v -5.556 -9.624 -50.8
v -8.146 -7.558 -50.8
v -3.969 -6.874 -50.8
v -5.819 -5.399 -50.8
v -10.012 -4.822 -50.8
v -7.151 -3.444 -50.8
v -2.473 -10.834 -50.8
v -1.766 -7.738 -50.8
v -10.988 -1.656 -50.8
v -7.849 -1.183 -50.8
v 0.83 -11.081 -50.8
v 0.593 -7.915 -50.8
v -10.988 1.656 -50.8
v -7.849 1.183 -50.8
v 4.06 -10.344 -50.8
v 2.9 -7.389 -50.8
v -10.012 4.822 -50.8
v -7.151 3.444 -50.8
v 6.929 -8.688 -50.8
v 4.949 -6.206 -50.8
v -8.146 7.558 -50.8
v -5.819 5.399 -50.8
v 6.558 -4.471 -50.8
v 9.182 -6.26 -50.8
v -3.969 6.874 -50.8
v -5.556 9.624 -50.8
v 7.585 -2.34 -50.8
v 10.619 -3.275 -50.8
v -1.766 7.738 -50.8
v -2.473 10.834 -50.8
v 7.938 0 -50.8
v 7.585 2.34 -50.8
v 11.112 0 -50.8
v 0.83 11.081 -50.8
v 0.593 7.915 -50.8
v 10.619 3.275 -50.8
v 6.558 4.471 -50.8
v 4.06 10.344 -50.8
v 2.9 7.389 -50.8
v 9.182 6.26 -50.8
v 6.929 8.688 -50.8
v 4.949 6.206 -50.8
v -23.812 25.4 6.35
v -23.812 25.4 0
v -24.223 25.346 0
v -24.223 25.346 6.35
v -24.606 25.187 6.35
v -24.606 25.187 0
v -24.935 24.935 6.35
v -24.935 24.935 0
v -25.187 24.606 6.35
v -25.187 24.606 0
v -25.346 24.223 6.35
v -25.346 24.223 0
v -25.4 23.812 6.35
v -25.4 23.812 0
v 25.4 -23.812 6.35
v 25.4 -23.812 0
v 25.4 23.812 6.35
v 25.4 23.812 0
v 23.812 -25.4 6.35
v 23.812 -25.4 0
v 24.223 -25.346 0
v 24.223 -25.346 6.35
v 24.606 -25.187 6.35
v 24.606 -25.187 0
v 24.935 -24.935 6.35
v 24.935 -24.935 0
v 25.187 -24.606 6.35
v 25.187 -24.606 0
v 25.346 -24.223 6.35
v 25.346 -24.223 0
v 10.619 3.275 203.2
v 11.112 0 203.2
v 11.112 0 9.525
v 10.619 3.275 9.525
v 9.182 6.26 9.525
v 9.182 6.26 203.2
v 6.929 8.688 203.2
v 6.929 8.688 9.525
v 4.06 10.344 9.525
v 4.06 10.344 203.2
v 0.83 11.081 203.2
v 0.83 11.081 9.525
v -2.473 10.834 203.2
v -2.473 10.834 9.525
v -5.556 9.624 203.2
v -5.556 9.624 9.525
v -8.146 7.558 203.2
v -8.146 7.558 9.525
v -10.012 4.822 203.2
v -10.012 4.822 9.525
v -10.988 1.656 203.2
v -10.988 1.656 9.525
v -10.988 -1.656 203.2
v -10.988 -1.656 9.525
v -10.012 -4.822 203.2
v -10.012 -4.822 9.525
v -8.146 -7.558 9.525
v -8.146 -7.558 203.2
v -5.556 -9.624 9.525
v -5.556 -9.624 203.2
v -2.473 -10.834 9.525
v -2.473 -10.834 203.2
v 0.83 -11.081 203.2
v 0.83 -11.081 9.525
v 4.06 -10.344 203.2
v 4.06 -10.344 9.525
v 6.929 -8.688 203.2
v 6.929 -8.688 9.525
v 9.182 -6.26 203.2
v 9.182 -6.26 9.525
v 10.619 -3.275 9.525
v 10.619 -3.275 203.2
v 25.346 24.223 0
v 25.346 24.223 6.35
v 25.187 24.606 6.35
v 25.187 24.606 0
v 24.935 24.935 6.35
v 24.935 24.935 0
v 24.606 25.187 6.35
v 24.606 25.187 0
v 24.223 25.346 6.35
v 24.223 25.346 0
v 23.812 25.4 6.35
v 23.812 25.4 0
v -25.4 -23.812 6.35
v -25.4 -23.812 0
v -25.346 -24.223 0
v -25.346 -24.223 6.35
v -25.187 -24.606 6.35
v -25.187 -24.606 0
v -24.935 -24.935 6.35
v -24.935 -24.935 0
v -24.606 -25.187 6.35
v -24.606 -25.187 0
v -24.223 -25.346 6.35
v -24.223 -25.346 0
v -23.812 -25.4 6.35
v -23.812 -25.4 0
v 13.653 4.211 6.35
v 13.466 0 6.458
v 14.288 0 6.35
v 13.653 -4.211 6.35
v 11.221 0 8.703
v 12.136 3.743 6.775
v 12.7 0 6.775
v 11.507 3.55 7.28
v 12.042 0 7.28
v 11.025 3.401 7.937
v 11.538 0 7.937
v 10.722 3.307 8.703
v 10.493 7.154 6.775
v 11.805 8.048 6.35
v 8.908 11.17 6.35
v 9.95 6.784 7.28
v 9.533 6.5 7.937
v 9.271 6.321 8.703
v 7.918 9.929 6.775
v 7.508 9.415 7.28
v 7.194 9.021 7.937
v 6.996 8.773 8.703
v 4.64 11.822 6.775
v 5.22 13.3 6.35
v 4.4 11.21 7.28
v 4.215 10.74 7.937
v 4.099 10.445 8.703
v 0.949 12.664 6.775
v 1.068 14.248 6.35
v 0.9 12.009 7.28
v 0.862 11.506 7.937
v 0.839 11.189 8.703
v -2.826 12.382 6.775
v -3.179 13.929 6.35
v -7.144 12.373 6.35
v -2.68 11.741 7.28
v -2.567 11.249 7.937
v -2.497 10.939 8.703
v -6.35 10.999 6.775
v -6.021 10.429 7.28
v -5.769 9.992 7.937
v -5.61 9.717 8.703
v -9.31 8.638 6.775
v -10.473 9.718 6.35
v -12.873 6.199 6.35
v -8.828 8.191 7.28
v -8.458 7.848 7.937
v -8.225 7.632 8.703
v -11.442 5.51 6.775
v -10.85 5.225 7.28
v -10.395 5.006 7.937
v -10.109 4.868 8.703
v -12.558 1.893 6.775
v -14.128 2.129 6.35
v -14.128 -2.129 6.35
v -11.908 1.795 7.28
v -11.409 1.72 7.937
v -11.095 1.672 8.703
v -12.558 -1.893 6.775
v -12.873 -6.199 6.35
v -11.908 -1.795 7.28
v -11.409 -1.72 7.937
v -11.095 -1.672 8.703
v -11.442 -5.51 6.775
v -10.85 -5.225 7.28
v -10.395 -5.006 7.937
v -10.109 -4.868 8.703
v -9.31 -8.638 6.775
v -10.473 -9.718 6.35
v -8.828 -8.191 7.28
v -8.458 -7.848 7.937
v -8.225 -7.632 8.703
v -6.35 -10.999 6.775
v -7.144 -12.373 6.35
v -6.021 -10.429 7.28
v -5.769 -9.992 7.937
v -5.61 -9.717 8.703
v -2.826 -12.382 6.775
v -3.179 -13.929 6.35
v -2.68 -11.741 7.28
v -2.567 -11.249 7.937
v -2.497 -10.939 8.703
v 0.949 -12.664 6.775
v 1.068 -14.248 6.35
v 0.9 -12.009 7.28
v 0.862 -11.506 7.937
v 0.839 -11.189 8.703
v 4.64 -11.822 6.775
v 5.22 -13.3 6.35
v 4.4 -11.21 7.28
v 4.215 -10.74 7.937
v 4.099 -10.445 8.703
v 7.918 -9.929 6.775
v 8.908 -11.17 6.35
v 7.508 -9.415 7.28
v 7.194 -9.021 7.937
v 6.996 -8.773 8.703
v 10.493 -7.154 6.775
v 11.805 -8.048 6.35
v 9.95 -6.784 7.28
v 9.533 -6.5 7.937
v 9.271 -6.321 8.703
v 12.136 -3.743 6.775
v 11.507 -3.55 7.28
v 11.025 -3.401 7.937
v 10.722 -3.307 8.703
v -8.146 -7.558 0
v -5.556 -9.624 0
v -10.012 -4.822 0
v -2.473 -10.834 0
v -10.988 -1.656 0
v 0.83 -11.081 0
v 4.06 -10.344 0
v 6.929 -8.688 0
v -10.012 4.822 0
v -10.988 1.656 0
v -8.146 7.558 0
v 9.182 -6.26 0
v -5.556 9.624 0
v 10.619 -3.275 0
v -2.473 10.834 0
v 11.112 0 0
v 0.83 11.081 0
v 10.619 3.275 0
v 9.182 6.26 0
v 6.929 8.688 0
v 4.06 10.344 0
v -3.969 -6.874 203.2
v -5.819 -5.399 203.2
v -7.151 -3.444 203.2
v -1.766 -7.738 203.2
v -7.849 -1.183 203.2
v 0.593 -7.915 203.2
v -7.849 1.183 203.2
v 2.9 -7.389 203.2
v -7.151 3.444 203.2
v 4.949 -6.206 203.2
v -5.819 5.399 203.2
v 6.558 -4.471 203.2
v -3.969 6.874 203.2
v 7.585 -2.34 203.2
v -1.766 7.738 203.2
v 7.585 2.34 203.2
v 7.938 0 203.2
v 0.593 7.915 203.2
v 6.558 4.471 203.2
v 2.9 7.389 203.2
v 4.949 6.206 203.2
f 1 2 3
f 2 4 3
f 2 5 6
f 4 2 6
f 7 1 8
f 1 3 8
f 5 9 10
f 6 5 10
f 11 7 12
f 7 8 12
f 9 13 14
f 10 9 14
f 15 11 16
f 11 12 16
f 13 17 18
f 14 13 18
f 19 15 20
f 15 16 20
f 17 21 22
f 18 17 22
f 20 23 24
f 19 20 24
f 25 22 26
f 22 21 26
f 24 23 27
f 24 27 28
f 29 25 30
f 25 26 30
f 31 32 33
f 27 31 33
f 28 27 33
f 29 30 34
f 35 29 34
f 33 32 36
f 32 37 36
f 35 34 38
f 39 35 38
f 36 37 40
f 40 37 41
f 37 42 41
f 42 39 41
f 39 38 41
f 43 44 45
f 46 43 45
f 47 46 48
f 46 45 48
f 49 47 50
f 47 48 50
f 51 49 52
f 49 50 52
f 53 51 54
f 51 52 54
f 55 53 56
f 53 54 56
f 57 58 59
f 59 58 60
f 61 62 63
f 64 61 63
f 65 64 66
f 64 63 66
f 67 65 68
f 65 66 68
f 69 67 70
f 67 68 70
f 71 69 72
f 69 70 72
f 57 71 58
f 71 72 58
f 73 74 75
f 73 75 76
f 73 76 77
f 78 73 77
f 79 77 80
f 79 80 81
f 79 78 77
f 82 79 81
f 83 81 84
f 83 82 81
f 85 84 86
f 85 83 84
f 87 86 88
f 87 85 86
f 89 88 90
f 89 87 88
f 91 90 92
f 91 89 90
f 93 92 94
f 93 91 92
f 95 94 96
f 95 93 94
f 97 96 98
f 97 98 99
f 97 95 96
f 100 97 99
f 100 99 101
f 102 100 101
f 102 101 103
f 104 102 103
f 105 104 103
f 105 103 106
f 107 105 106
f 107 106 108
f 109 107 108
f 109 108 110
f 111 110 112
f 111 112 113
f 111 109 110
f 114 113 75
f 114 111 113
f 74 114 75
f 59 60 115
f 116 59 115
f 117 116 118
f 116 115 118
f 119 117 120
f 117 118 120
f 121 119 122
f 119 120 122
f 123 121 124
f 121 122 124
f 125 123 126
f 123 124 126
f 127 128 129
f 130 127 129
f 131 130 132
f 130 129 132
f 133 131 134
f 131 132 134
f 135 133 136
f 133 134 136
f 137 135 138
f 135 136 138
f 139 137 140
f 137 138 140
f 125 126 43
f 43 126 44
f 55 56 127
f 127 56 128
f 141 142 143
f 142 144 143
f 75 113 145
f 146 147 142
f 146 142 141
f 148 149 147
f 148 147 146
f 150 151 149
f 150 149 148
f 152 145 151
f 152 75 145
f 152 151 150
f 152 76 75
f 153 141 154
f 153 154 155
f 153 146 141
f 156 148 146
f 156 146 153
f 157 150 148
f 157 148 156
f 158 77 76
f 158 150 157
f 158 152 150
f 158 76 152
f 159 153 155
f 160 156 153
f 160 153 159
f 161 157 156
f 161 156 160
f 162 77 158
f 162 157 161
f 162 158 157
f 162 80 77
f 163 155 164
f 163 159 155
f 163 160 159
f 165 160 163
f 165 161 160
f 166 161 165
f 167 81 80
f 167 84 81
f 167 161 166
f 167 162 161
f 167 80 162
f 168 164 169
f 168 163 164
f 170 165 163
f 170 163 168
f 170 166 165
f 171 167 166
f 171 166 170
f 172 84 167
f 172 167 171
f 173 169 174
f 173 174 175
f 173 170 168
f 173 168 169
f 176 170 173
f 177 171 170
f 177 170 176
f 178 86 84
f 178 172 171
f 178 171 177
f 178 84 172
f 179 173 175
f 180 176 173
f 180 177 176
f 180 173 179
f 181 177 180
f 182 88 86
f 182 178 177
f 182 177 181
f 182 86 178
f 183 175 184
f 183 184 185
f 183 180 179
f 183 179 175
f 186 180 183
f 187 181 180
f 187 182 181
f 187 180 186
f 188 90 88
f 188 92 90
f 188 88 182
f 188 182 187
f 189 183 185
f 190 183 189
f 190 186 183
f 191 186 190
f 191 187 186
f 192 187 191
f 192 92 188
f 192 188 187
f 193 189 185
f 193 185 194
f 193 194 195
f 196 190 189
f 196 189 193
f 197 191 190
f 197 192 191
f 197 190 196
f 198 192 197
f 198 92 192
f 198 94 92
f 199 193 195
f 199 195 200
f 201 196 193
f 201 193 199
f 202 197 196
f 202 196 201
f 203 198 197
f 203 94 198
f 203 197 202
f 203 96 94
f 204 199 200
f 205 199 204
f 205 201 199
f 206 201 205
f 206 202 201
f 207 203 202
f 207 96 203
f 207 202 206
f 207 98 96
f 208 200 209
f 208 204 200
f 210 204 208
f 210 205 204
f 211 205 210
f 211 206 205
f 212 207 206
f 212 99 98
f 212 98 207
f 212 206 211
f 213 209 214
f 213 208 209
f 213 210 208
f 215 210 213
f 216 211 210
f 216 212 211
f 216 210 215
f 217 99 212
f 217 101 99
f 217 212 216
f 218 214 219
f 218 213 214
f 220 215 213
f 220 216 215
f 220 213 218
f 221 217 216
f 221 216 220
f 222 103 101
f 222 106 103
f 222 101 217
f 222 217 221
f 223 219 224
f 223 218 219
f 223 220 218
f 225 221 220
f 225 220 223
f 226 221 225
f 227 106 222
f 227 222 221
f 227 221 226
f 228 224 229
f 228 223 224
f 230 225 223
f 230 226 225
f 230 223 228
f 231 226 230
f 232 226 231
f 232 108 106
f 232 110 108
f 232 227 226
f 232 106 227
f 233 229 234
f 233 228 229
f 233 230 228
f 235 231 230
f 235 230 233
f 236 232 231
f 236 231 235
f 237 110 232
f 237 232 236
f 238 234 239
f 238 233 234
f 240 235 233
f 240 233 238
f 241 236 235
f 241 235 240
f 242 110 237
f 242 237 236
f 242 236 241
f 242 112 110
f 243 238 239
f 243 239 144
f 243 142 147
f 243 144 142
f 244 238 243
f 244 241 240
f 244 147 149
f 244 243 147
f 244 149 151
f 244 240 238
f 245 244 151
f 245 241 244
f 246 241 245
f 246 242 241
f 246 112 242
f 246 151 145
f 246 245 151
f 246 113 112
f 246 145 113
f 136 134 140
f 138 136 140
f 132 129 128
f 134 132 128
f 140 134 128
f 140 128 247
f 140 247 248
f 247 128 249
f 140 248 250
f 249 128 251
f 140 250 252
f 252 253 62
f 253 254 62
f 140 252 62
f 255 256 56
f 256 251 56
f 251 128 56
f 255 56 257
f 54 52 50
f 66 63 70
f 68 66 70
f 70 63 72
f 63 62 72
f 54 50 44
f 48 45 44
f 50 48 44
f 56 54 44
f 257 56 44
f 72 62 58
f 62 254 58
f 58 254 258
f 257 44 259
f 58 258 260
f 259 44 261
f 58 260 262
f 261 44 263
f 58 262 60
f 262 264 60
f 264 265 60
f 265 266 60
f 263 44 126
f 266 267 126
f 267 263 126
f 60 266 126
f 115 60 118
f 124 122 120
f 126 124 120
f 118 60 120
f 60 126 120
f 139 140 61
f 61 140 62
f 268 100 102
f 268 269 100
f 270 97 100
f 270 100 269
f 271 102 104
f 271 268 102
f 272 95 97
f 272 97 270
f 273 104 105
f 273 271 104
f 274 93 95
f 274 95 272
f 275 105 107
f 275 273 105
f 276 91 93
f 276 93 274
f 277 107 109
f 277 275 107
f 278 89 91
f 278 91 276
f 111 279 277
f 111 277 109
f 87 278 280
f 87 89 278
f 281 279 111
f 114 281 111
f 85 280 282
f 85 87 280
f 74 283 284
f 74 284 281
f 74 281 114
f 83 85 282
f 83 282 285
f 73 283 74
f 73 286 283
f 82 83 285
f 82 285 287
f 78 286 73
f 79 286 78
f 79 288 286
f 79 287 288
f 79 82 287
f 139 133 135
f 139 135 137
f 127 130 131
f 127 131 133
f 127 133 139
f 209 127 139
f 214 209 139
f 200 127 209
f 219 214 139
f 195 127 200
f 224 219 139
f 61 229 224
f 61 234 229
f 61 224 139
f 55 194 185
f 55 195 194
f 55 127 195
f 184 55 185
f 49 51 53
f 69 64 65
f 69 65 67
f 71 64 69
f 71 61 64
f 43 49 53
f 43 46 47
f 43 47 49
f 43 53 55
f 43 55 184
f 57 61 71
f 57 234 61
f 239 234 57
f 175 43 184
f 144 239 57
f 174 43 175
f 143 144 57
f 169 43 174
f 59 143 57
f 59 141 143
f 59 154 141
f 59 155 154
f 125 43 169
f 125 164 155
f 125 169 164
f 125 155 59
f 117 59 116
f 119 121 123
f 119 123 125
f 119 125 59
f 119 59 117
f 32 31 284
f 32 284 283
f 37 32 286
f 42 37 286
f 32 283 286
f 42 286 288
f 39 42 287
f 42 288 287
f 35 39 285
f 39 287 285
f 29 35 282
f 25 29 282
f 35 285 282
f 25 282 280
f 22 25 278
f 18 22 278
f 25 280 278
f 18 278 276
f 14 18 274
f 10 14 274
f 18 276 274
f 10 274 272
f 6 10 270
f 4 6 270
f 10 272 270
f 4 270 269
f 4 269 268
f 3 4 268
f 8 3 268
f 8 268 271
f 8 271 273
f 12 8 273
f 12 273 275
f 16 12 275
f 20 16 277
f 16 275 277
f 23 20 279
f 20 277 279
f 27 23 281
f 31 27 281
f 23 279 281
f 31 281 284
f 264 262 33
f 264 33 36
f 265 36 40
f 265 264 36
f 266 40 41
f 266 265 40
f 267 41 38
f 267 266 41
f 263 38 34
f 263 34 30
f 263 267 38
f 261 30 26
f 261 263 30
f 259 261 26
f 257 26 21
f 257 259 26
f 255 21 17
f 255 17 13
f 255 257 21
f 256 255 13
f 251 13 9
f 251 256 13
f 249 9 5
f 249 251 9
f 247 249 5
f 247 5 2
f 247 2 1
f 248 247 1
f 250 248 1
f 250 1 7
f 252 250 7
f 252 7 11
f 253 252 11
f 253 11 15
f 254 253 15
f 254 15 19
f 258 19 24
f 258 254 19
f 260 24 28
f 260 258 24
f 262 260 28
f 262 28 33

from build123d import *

# Parameters (mm, degrees)
F0_R          = 11.1125
F0_R_2        = 7.9375
F1_DEPTH      = 203.2
F1_DEPTH_BACK = 50.8
F2_R          = 7.9375
F3_DEPTH      = 6.35
F4_R          = 3.175


with BuildPart() as f1:
    # F0 (on Top) → F1 (new body, two sides)
    with BuildSketch(Plane.XY) as f1_sk:
        Circle(F0_R)
        Circle(F0_R_2, mode=Mode.SUBTRACT)
    extrude(amount=F1_DEPTH)
    extrude(f1_sk.sketch, amount=-F1_DEPTH_BACK)

    # F2 (on Top) → F3 (join)
    with BuildSketch(Plane.XY):
        with BuildLine():
            ThreePointArc((25.4, 23.8125), (24.935032, 24.935032), (23.8125, 25.4))
            Line((23.8125, 25.4), (-23.8125, 25.4))
            ThreePointArc((-23.8125, 25.4), (-24.935032, 24.935032), (-25.4, 23.8125))
            Line((-25.4, 23.8125), (-25.4, -23.8125))
            ThreePointArc((-25.4, -23.8125), (-24.935032, -24.935032), (-23.8125, -25.4))
            Line((-23.8125, -25.4), (23.8125, -25.4))
            ThreePointArc((23.8125, -25.4), (24.935032, -24.935032), (25.4, -23.8125))
            Line((25.4, -23.8125), (25.4, 23.8125))
        make_face()
        Circle(F2_R, mode=Mode.SUBTRACT)
    extrude(amount=F3_DEPTH)

    # F4
    f4_edges = [f1.edges().sort_by_distance(p)[0] for p in [
        (-11.1125, 0, 6.35),
    ]]
    fillet(f4_edges, radius=F4_R)


solid = f1.part
